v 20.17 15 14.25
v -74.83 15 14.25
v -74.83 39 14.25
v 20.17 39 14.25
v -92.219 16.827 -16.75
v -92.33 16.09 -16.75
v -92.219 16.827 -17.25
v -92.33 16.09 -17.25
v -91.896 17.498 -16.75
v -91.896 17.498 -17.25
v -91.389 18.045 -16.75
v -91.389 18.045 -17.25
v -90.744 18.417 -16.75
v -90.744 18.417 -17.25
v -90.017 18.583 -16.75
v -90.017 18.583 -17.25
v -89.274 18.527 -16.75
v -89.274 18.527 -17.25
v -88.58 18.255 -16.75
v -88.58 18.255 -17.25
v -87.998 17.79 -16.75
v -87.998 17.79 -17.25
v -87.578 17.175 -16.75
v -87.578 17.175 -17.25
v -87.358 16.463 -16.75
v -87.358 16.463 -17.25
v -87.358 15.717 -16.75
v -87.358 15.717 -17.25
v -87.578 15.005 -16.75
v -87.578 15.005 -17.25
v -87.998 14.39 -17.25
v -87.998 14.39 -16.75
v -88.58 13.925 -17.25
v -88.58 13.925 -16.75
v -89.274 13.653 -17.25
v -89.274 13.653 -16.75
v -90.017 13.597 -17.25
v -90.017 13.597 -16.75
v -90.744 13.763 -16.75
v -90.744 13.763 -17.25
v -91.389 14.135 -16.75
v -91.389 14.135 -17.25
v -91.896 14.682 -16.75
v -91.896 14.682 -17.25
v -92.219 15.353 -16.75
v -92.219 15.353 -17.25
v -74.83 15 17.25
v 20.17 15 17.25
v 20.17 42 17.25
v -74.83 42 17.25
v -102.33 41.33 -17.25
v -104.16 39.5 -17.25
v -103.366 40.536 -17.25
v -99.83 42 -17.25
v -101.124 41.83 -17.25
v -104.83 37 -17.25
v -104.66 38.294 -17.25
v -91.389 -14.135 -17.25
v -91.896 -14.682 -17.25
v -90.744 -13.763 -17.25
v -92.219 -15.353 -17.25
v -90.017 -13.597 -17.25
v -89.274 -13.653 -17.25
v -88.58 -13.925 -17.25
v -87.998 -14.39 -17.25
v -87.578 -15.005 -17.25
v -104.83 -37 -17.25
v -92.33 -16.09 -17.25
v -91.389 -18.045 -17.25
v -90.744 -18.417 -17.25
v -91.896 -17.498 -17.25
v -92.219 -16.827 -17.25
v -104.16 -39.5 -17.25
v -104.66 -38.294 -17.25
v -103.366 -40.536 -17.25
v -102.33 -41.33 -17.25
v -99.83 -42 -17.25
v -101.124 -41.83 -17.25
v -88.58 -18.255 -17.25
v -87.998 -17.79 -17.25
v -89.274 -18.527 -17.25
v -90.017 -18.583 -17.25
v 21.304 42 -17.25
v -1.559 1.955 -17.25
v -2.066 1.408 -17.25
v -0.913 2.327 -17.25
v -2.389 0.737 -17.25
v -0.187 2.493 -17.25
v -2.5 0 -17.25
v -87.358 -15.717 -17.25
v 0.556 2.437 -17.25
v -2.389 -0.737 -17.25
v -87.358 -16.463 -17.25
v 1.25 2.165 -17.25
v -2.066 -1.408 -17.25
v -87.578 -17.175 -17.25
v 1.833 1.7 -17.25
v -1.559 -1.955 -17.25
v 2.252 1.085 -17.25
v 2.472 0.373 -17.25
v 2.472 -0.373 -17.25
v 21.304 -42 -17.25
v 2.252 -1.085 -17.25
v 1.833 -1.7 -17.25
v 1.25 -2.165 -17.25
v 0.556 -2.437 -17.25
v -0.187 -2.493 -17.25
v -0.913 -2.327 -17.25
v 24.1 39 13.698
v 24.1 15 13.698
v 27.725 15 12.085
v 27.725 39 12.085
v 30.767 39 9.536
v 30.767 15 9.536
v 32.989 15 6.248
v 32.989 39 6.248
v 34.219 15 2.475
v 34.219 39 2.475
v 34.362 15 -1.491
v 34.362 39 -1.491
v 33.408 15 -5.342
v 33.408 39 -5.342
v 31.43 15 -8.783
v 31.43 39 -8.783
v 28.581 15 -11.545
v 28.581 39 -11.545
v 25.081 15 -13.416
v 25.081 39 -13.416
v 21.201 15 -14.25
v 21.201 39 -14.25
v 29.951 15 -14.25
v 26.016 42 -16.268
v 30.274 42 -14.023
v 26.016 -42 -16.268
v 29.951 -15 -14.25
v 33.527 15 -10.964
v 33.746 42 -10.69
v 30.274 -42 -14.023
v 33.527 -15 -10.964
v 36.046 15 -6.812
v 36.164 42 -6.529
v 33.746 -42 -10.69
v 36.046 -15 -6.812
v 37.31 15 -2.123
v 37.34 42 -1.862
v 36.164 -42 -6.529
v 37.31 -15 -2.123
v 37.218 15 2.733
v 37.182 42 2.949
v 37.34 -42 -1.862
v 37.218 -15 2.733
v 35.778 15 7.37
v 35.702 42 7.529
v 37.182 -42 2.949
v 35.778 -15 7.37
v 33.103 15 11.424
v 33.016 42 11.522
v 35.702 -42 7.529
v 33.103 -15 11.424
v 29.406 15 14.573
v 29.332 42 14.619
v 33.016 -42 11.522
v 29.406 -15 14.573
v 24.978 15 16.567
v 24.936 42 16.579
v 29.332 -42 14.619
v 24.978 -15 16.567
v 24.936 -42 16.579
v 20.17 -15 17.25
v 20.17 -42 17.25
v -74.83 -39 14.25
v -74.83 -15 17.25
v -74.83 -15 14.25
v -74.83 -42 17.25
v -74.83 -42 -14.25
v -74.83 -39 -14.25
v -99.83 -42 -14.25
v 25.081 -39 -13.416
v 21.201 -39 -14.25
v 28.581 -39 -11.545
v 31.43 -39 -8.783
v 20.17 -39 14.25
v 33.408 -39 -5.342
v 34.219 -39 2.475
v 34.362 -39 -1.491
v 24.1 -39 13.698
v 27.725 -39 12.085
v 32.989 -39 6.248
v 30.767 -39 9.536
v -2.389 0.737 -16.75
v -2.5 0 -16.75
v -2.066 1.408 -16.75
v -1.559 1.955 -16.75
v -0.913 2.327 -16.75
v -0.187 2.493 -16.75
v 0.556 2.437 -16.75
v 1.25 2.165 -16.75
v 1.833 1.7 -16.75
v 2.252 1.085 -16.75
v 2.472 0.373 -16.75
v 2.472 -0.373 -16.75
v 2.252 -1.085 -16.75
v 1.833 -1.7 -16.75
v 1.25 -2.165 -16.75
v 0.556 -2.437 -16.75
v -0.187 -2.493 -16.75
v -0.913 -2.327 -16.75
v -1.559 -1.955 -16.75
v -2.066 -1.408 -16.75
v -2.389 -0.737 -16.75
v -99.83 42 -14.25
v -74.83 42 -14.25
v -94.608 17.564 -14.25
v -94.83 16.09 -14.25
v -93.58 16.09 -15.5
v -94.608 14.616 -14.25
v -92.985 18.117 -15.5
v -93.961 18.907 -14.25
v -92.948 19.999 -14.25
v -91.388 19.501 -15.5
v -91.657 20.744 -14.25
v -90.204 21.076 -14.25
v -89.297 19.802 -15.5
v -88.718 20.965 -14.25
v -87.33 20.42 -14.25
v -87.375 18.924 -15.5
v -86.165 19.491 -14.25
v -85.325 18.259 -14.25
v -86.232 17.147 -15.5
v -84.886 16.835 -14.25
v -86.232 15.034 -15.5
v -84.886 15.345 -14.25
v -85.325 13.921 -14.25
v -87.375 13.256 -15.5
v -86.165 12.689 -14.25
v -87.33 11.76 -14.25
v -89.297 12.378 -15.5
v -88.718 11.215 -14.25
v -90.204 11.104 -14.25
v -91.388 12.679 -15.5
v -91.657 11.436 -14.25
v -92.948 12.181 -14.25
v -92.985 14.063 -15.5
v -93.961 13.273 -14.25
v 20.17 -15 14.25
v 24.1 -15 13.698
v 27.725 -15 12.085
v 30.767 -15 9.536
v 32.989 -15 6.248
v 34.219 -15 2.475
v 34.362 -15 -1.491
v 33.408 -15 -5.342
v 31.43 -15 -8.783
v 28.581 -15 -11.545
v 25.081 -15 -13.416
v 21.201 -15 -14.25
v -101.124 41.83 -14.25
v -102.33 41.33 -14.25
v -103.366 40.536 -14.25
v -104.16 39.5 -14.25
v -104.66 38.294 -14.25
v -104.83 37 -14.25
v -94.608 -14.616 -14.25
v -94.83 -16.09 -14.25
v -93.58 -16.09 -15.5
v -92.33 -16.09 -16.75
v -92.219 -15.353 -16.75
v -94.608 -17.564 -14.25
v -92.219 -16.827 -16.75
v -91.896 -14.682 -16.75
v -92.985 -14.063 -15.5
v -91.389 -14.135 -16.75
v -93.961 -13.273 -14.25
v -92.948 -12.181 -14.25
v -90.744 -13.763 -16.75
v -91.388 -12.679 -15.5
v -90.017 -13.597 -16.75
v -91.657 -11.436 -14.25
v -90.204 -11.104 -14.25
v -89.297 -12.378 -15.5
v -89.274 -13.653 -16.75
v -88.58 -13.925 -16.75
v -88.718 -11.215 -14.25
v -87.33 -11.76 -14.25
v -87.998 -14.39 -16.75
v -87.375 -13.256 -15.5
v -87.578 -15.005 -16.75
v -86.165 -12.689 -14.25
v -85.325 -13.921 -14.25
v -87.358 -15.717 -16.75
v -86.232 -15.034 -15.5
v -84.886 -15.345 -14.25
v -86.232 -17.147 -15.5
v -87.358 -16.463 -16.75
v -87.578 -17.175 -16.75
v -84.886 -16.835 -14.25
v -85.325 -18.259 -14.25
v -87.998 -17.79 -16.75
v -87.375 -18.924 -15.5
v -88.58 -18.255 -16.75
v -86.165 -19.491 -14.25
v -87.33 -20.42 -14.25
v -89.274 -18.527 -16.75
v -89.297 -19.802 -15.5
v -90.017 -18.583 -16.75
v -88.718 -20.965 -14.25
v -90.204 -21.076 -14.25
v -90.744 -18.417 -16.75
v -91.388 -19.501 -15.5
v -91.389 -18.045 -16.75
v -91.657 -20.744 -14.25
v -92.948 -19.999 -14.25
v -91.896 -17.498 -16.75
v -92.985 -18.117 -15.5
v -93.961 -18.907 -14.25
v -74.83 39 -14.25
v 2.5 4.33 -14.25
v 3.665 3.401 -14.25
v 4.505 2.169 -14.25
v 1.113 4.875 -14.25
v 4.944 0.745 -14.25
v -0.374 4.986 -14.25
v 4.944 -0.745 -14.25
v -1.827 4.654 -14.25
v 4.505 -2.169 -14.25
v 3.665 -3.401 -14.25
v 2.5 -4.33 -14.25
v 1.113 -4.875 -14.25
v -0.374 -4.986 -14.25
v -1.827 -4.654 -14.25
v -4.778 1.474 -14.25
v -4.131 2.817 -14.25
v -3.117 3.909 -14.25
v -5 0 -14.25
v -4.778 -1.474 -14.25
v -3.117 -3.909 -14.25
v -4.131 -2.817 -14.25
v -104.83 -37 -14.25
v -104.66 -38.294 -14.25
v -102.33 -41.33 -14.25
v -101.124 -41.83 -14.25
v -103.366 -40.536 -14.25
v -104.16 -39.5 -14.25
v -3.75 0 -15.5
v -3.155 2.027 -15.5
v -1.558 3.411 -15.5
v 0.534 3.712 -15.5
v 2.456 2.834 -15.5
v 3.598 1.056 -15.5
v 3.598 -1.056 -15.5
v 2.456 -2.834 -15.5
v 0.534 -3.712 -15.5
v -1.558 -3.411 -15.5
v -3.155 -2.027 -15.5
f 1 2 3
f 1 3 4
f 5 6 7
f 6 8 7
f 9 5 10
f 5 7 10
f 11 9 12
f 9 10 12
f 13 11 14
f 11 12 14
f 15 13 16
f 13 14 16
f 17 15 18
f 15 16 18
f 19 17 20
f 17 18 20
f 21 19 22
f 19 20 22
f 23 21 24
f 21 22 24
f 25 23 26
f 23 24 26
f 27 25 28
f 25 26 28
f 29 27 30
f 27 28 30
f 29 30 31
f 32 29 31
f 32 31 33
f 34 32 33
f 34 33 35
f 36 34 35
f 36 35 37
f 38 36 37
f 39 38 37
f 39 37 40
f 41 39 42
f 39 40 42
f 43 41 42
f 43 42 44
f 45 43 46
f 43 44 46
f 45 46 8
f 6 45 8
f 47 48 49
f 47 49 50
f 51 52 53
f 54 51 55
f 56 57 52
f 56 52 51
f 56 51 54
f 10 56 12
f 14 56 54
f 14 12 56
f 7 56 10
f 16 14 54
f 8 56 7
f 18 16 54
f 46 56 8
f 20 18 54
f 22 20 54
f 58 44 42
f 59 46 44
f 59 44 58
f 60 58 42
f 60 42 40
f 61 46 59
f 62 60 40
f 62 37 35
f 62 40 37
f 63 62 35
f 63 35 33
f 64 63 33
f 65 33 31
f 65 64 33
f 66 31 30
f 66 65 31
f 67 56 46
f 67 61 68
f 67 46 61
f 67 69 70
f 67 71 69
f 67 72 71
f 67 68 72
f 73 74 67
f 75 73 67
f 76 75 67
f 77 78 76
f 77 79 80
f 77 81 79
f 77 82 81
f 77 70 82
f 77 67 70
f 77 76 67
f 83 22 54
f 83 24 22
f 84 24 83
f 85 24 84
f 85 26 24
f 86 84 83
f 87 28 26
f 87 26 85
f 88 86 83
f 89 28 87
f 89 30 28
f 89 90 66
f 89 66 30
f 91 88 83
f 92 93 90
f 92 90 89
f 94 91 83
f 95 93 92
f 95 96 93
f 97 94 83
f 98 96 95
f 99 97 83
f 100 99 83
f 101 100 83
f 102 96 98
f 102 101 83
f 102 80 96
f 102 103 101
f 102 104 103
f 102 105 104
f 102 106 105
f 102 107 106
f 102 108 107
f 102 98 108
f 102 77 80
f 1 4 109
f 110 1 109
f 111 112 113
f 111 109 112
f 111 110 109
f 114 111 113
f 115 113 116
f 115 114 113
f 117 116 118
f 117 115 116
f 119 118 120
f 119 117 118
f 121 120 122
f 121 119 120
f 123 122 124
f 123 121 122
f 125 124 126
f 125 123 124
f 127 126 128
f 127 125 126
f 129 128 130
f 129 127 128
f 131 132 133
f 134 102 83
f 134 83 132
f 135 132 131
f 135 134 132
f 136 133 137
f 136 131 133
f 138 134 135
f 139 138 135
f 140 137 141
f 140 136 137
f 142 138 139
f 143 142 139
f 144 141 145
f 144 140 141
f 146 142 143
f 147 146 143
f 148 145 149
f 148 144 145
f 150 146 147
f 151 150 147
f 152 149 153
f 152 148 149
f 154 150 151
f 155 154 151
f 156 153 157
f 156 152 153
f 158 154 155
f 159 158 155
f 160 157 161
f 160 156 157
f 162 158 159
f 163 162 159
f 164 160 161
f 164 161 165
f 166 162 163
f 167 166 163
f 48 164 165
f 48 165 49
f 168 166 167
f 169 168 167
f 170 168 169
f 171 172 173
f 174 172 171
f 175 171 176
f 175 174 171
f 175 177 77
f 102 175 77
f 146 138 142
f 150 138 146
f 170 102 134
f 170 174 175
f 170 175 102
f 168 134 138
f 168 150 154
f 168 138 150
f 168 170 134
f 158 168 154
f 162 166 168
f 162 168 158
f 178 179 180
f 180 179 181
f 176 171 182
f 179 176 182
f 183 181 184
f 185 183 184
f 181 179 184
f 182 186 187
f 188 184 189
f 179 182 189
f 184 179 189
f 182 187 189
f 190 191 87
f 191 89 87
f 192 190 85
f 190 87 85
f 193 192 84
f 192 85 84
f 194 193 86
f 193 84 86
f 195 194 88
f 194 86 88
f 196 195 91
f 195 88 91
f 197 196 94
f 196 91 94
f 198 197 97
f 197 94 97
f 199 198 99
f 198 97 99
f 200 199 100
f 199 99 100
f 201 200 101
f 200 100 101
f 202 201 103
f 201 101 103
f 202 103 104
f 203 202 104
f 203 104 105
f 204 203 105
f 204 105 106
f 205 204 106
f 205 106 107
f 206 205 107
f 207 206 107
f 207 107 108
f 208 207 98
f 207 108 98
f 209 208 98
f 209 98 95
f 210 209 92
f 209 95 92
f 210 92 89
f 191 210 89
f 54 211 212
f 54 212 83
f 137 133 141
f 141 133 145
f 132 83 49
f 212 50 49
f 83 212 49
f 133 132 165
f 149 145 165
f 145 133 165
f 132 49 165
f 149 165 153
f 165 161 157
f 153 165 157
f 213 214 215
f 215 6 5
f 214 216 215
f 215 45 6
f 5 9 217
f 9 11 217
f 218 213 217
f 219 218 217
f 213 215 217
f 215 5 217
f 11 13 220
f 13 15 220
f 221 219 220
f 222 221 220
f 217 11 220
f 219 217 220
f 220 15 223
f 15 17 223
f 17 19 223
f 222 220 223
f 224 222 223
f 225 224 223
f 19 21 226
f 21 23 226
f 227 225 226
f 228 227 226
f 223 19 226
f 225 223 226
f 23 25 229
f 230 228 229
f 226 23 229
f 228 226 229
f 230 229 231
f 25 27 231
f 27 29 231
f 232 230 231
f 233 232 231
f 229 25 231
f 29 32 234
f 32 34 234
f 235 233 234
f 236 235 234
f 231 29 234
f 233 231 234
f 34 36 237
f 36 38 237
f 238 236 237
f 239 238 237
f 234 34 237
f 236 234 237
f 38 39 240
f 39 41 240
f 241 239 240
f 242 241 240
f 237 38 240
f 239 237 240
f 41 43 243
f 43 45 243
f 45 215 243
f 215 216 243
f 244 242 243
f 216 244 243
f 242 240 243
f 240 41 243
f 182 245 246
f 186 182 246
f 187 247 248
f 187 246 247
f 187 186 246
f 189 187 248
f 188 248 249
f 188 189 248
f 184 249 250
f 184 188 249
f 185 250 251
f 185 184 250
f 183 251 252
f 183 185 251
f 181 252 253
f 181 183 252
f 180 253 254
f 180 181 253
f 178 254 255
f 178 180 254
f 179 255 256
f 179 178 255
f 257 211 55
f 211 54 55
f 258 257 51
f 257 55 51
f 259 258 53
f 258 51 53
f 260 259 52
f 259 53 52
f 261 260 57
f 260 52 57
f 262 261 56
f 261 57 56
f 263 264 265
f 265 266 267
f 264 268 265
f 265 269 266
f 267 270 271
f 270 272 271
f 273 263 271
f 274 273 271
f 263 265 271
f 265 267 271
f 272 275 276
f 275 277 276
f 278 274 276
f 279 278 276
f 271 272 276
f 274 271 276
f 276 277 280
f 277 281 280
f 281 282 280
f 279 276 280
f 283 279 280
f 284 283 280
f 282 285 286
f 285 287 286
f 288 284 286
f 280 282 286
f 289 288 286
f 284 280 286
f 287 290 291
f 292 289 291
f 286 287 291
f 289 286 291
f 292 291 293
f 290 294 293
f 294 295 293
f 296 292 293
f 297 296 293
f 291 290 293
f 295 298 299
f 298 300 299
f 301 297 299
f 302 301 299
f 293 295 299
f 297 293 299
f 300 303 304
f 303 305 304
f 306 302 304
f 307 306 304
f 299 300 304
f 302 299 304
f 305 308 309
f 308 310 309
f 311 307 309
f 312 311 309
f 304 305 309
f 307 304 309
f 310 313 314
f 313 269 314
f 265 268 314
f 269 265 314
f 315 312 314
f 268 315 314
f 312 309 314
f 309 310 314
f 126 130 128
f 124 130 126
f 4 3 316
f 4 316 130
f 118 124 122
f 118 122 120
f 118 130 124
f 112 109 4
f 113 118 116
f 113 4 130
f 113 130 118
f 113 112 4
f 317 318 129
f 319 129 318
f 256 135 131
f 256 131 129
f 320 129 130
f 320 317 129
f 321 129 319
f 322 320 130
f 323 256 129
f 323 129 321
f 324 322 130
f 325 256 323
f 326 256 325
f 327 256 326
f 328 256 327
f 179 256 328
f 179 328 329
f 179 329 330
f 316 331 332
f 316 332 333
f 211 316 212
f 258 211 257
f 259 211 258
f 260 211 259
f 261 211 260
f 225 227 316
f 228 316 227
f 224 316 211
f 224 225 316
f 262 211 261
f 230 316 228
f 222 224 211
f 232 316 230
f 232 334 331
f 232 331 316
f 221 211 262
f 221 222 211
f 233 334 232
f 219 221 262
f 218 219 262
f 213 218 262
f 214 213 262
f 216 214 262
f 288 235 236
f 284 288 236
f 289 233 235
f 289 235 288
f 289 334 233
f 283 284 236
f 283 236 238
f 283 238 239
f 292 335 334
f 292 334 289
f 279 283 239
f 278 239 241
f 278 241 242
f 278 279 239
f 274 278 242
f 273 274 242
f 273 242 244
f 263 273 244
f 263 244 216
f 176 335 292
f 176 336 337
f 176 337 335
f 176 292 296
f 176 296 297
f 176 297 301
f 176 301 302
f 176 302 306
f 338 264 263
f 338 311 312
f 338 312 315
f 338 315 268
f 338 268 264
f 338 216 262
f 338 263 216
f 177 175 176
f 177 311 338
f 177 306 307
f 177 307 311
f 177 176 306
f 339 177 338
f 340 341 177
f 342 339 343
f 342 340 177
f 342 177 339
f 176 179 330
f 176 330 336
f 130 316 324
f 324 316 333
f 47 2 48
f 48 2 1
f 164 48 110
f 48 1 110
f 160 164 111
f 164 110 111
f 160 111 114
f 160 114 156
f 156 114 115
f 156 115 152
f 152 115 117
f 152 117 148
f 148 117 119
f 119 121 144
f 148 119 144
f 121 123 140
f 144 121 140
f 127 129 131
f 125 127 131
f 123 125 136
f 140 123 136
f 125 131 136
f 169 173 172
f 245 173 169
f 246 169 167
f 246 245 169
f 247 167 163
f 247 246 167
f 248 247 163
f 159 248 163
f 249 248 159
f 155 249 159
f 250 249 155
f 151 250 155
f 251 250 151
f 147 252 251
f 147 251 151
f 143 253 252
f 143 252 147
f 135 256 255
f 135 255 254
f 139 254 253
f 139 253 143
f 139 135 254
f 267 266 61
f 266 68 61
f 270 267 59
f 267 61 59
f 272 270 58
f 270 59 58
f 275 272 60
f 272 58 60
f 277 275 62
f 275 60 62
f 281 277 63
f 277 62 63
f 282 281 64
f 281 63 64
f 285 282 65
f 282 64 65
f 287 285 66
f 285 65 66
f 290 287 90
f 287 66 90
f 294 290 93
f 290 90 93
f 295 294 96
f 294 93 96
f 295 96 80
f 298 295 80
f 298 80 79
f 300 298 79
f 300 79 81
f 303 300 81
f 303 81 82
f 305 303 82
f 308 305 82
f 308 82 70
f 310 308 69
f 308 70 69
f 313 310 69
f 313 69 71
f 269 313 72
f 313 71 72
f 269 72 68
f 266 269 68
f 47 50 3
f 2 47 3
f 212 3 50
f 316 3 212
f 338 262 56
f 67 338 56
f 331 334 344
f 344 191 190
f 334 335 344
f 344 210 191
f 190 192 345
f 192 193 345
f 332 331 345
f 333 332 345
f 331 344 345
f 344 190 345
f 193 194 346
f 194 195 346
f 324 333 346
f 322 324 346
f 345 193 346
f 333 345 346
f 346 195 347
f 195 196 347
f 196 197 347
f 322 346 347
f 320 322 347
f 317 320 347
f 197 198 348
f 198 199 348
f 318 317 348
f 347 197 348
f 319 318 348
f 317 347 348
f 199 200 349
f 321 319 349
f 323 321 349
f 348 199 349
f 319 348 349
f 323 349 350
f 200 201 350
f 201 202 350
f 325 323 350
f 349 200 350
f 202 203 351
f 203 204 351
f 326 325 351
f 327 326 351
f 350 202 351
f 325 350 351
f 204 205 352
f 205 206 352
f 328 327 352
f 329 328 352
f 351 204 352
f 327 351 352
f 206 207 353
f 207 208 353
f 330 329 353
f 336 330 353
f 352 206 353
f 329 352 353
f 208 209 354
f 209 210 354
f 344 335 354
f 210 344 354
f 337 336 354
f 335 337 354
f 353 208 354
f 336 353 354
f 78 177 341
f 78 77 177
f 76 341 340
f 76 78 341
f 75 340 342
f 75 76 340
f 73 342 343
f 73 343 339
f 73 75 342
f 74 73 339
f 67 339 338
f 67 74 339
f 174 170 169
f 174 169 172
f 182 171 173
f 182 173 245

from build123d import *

# Parameters (mm, degrees)
F1_DEPTH       = 42
F1_DEPTH_BACK  = 42
F3_DEPTH       = 3
F4_W           = 171.0703811337
F4_H           = 30
F5_DEPTH       = 31.501
F6_R           = 5
F8_D           = 5
F8_CSINK_D     = 10
F8_CSINK_ANGLE = 90


# Not quite as in the source:
# - a pattern or mirror of a feature is missing from the dataset's text; its kind, count and spacing are read off the source's solid


with BuildPart() as f1:
    # F0 (on Front) → F1 (new body, two sides)
    with BuildSketch(Plane.XZ) as f1_sk:
        with BuildLine():
            Line((-74.8302465006, 17.25), (-74.8302465006, 14.25))
            Line((-74.8302465006, 14.25), (20.1697534994, 14.25))
            ThreePointArc((20.1697534994, 14.25), (34.429081055, 0.4973529093), (21.2011066634, -14.25))
            Line((21.2011066634, -14.25), (-104.8302465006, -14.25))
            Line((-104.8302465006, -14.25), (-104.8302465006, -17.25))
            Line((-104.8302465006, -17.25), (21.3044886882, -17.25))
            ThreePointArc((21.3044886882, -17.25), (37.4290815856, 0.5490131867), (20.1697534994, 17.25))
            Line((20.1697534994, 17.25), (-74.8302465006, 17.25))
        make_face()
    extrude(amount=F1_DEPTH)
    extrude(f1_sk.sketch, amount=-F1_DEPTH_BACK)

    # F2 (on face) → F3 (join)
    with BuildSketch(Plane.XZ.offset(42)):
        with BuildLine():
            Line((20.1697534994, 17.25), (-74.8302465006, 17.25))
            Line((-74.8302465006, 17.25), (-74.8302465006, -17.25))
            Line((-74.8302465006, -17.25), (21.3044886882, -17.25))
            ThreePointArc((21.3044886882, -17.25), (37.4290815856, 0.5490131867), (20.1697534994, 17.25))
        make_face()
    f3 = extrude(amount=-F3_DEPTH)

    # F3_copies: F3 across plane
    add(f3.mirror(Plane.ZX))

    # F4 (on face) → F5 (cut, through all)
    with BuildSketch(Plane.XY.offset(-14.25)):
        with Locations((-19.9944982305, 0)):
            Rectangle(F4_W, F4_H)
    extrude(amount=F5_DEPTH, mode=Mode.SUBTRACT)

    # F6
    f6_edges = [f1.edges().sort_by_distance(p)[0] for p in [
        (-104.830247, -42, -15.75),
        (-104.830247, 42, -15.75),
    ]]
    fillet(f6_edges, radius=F6_R)

    # F8 (through all)
    with Locations(Plane.XY.offset(-14.25)):
        with Locations((-89.8302465006, -16.0900652409), (-89.8302465006, 16.0900652409), (0, 0)):
            CounterSinkHole(F8_D / 2, F8_CSINK_D / 2, counter_sink_angle=F8_CSINK_ANGLE)


solid = f1.part
